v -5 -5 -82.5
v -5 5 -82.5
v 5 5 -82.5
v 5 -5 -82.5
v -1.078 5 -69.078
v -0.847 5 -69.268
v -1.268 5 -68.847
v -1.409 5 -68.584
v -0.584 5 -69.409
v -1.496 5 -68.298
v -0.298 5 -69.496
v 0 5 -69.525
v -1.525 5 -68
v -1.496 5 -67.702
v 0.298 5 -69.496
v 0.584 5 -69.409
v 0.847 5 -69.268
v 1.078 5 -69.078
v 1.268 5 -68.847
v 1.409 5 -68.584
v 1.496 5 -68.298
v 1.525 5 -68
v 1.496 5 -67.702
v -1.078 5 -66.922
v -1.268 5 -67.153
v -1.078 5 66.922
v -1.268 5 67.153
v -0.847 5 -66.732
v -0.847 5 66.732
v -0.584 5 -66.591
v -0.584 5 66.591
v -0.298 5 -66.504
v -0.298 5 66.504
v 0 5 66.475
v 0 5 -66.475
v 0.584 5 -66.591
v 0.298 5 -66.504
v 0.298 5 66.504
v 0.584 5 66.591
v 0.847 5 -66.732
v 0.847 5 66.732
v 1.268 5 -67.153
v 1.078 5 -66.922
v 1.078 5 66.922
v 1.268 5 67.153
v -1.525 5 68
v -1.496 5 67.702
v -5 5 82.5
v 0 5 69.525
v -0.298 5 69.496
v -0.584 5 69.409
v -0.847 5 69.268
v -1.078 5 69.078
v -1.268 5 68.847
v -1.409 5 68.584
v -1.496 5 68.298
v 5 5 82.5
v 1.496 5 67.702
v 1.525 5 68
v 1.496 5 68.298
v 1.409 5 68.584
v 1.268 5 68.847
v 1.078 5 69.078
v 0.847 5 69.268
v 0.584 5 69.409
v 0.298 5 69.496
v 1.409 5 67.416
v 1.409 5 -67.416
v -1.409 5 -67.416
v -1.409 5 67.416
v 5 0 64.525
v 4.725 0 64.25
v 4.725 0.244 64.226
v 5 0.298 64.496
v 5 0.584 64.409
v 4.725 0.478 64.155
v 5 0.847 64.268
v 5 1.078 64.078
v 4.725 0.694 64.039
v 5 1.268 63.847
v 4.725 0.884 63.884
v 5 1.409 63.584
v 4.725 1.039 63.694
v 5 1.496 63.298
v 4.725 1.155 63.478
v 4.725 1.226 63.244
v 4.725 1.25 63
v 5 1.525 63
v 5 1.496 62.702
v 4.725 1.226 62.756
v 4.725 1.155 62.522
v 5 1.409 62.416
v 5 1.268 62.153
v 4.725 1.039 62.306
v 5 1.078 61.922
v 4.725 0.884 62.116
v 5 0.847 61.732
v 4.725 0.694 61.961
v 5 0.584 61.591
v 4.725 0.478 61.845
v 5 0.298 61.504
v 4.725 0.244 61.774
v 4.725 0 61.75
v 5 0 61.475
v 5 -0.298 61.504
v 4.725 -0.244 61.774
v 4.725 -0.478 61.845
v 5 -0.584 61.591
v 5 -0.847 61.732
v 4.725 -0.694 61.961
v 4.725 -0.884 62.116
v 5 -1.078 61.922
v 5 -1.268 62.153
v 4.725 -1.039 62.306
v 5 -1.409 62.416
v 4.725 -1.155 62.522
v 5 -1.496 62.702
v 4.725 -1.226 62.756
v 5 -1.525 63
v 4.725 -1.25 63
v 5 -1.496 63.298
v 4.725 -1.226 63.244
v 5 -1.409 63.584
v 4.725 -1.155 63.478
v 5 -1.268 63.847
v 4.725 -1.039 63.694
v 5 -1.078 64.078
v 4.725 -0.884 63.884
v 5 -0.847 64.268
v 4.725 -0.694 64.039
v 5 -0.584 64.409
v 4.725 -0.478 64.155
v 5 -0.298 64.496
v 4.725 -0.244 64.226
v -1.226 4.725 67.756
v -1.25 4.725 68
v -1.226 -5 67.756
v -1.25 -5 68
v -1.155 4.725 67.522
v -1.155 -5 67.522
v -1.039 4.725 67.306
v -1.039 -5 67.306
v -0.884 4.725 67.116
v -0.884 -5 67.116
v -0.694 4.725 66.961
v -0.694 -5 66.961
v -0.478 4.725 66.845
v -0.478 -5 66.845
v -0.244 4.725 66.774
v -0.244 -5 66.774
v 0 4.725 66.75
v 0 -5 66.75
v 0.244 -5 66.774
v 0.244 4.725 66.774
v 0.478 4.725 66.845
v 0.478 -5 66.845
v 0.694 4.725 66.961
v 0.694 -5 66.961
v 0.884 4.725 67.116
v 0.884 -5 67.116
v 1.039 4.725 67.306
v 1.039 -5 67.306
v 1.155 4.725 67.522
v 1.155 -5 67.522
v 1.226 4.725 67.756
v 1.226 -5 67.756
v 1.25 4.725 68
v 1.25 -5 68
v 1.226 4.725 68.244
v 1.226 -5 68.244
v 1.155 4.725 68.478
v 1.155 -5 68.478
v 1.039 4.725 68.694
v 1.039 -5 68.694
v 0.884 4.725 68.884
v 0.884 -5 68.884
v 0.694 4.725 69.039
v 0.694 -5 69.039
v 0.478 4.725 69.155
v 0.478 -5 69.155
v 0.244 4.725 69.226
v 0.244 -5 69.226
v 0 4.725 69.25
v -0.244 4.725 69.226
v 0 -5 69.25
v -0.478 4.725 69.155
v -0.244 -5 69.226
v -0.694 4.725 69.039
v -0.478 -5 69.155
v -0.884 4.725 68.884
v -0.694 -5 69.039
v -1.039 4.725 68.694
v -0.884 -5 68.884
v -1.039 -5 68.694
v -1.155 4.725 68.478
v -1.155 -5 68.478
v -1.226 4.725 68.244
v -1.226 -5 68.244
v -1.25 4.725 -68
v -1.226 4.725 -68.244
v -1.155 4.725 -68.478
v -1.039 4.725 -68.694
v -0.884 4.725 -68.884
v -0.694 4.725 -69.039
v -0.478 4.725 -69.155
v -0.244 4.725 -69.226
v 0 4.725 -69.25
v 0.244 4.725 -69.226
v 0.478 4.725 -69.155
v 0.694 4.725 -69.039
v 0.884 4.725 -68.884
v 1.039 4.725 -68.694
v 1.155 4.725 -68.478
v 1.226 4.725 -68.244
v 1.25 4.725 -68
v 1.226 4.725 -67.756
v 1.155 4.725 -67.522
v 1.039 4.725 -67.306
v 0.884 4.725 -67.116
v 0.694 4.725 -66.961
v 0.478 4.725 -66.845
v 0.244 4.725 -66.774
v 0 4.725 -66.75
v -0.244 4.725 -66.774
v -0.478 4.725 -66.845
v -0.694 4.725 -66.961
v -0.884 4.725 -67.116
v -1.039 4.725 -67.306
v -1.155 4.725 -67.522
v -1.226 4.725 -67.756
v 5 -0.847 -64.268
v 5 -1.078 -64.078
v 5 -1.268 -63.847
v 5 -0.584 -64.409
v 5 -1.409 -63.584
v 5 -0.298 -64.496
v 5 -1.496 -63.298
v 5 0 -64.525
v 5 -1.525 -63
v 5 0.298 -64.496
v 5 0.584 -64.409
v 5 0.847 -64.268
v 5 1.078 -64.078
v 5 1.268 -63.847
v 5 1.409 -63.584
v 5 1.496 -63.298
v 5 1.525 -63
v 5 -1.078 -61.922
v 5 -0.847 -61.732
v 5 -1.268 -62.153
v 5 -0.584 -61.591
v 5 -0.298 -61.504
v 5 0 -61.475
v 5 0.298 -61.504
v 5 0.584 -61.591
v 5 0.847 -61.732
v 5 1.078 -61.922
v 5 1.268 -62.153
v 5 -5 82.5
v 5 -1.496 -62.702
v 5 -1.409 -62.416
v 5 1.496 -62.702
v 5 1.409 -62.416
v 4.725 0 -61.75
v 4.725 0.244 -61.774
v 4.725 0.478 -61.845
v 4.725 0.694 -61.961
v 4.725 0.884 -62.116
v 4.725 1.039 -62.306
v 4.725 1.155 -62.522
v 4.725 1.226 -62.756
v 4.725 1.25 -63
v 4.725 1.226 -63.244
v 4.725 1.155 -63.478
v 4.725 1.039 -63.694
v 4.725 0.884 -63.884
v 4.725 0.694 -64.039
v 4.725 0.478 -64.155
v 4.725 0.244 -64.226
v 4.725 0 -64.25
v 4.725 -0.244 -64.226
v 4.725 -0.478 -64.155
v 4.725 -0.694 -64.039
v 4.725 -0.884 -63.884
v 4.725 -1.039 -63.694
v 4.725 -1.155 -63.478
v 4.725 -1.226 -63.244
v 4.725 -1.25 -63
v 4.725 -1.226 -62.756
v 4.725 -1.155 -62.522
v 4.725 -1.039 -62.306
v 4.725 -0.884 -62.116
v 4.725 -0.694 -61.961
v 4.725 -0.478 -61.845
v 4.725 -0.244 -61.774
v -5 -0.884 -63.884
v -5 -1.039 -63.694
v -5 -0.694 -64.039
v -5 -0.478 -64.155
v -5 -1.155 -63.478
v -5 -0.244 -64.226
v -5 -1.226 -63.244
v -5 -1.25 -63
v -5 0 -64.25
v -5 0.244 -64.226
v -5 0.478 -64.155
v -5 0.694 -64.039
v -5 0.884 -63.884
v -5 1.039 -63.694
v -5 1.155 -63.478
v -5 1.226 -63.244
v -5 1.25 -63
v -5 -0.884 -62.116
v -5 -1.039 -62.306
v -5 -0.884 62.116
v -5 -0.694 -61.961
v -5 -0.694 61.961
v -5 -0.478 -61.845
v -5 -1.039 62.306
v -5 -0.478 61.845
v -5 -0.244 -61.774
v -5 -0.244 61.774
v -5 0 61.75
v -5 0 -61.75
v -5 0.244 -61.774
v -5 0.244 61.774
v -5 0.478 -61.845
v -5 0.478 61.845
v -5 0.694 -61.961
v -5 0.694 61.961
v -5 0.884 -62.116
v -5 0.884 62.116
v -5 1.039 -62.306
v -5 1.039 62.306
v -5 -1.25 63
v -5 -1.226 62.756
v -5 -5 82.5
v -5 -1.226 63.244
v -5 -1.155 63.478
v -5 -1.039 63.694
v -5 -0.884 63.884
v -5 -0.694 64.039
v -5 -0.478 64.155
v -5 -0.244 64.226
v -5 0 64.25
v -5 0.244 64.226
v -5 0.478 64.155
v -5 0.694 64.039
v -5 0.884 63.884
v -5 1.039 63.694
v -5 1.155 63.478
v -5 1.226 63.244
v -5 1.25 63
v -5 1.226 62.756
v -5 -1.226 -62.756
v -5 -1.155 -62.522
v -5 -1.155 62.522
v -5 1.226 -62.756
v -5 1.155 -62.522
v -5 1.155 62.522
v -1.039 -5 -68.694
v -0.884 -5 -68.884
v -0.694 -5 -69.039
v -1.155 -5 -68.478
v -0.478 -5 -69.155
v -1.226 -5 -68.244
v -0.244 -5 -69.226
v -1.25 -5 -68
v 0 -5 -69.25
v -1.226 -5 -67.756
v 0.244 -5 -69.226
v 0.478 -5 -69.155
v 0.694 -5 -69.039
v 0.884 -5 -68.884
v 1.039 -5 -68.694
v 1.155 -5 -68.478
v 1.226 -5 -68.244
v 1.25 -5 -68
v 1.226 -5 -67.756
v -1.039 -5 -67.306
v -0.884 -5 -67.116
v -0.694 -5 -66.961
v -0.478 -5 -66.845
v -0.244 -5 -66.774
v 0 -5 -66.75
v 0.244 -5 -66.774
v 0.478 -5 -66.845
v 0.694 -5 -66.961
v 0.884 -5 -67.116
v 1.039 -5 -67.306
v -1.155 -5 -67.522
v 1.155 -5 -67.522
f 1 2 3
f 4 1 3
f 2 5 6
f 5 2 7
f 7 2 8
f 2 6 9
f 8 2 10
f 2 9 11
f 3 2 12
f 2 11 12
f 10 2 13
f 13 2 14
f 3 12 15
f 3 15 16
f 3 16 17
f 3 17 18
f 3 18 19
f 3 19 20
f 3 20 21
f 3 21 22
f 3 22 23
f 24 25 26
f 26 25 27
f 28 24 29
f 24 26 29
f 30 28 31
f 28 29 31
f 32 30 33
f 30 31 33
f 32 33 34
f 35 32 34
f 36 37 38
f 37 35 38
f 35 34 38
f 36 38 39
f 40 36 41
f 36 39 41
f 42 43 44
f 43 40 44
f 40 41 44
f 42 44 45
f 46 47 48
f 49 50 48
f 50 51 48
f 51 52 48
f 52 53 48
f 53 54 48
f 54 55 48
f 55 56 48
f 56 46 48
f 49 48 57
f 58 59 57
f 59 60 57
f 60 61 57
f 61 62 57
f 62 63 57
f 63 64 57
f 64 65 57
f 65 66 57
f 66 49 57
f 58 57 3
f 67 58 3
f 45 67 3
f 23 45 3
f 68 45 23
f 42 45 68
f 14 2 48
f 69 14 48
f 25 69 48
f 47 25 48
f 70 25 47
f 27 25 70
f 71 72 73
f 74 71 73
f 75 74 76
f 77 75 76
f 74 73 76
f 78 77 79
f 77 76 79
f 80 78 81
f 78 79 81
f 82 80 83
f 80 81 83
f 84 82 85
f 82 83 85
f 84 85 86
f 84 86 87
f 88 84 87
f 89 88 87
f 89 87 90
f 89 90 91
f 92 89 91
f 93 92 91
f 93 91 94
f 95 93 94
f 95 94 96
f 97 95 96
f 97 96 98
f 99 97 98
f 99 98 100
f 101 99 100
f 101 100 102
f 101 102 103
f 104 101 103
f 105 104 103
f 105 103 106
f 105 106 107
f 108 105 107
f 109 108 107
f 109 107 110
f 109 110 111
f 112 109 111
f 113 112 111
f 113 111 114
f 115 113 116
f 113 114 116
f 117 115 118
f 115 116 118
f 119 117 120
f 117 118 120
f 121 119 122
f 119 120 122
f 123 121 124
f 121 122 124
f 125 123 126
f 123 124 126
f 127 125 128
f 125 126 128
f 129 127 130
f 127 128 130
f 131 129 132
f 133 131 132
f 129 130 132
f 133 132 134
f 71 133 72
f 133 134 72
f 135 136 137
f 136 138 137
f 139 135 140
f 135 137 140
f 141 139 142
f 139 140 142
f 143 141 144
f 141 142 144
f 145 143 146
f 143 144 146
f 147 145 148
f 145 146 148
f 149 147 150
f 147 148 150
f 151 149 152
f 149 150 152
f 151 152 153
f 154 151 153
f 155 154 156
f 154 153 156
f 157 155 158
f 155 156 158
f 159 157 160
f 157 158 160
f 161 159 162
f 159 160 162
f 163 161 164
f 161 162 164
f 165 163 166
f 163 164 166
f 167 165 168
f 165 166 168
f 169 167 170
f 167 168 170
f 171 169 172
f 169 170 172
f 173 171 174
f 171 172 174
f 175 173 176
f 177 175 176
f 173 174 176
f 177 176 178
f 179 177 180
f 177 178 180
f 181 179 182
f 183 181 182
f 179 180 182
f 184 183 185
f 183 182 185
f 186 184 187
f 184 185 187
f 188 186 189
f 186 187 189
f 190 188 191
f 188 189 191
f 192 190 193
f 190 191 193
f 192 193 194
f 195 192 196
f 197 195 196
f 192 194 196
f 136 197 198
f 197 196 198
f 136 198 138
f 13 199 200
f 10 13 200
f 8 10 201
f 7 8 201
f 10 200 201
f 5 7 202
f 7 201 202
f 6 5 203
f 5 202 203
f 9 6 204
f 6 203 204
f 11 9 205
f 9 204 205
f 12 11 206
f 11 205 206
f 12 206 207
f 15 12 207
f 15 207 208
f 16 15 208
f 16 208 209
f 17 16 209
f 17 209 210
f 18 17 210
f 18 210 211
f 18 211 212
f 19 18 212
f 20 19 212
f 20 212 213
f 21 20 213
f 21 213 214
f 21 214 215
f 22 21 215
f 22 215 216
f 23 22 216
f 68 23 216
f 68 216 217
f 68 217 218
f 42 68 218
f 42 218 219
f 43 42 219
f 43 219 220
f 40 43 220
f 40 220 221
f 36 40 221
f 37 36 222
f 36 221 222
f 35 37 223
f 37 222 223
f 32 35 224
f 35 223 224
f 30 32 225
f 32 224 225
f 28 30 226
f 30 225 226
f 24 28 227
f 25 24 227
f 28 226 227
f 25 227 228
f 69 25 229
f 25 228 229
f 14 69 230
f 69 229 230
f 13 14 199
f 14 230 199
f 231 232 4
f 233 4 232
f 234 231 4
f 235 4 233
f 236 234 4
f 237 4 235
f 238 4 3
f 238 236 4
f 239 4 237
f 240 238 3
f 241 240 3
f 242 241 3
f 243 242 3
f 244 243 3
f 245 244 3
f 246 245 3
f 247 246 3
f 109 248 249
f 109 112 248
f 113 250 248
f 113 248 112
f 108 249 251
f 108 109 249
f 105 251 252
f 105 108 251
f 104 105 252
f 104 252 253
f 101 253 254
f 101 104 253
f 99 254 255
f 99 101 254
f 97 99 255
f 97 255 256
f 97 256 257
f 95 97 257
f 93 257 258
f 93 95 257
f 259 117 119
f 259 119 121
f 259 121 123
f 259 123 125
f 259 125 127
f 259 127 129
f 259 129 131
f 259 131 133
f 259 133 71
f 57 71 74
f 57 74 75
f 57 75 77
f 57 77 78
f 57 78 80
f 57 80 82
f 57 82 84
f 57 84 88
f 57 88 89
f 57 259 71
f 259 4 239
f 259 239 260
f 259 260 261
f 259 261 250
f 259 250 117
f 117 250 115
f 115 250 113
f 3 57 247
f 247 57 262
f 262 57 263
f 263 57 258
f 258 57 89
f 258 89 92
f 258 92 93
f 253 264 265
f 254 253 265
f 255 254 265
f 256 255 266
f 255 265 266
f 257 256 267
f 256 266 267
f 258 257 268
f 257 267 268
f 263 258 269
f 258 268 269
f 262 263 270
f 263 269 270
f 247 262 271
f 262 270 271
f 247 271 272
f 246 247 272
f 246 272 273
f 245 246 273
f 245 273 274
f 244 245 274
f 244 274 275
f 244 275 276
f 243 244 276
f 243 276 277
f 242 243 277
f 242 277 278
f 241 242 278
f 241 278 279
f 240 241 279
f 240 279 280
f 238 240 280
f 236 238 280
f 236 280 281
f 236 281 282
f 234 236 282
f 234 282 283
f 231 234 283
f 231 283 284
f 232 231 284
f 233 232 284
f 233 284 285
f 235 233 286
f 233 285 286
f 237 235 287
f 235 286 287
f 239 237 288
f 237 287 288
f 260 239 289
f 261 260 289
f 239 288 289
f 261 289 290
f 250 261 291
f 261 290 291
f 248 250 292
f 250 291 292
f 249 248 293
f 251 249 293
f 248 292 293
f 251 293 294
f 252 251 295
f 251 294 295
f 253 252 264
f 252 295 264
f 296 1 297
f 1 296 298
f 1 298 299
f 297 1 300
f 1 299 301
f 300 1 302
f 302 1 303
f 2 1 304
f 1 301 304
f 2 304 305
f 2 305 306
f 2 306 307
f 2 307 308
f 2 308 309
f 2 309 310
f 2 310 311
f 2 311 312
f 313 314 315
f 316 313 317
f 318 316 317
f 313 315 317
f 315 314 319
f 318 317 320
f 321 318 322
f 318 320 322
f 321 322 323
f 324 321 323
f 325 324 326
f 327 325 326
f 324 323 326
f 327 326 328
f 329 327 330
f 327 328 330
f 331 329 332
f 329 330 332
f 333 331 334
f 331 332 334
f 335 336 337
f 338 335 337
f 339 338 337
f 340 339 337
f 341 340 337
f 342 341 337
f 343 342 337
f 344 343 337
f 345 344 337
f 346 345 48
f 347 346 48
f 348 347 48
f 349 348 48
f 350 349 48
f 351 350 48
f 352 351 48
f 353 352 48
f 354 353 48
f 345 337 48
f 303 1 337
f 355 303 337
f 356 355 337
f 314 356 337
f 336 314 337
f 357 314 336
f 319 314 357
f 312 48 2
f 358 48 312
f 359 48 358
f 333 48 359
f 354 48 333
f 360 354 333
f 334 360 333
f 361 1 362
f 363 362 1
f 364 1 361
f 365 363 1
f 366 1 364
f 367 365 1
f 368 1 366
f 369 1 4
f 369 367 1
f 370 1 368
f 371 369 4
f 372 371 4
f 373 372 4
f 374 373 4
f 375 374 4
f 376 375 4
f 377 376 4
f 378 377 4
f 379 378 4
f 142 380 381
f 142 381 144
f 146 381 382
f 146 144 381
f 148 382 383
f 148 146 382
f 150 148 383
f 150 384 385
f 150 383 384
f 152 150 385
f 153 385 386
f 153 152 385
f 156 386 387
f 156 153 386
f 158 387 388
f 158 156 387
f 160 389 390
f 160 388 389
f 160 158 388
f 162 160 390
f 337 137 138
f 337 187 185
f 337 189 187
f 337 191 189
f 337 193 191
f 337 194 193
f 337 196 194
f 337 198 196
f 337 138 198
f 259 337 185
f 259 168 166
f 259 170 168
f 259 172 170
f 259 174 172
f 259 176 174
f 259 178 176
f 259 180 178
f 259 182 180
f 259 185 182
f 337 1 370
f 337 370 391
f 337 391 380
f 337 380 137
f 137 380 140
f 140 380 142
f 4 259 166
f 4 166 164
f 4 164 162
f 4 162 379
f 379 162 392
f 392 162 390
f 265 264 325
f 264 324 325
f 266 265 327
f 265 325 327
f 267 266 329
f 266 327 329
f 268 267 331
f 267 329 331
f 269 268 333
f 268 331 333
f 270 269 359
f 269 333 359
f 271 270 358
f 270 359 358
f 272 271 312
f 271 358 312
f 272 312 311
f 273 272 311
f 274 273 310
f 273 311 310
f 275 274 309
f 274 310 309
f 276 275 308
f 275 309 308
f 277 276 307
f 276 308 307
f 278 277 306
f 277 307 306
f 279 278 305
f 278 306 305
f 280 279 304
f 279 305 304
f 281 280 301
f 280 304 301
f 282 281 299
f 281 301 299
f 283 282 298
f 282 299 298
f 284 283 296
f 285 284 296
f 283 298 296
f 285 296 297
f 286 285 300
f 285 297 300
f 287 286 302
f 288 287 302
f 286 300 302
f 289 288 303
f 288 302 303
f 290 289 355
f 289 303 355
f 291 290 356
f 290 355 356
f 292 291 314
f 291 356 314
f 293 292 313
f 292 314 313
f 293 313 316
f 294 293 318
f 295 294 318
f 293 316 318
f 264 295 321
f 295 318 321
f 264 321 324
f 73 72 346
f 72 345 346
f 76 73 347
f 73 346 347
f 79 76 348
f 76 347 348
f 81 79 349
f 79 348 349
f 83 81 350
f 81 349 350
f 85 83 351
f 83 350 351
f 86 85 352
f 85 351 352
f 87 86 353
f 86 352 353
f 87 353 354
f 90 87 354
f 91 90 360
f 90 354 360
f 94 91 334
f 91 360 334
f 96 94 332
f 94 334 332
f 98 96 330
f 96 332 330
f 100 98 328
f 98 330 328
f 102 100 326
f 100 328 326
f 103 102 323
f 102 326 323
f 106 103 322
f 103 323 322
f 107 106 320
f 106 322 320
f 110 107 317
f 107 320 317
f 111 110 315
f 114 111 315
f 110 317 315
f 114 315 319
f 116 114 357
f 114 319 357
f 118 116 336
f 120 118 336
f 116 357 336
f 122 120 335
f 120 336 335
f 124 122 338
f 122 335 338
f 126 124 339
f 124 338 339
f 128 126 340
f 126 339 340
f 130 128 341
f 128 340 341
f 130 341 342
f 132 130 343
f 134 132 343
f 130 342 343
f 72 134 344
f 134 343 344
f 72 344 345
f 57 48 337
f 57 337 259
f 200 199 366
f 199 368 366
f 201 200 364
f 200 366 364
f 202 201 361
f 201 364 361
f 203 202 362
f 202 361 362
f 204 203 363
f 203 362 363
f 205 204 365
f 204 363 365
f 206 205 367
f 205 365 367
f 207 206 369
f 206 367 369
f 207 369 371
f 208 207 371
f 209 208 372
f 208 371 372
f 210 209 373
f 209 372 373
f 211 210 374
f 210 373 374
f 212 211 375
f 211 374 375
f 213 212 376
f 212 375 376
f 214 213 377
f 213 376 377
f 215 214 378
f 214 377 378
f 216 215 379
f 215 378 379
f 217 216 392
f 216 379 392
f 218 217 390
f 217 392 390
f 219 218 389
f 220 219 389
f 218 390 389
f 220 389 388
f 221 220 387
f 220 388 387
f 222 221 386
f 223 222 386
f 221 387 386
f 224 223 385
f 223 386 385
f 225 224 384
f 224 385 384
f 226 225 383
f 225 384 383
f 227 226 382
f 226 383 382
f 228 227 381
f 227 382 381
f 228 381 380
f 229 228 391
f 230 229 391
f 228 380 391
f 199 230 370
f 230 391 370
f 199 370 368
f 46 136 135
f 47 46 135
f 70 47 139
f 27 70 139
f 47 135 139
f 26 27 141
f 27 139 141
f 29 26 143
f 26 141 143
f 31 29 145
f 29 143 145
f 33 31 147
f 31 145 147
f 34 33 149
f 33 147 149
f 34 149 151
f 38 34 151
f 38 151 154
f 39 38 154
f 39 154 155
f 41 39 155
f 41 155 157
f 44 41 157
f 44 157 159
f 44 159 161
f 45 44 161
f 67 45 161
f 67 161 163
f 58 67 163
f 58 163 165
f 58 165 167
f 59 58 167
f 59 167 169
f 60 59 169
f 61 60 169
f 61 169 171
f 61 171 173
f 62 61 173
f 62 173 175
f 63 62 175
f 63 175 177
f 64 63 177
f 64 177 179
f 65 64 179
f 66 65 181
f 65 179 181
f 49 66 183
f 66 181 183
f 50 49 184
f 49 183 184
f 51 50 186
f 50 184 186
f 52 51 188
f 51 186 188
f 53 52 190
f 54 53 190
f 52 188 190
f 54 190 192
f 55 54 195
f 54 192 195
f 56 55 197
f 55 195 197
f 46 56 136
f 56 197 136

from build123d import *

# Parameters (mm, degrees)
ESQUISSE1_W                     = 10
ESQUISSE1_H                     = 10
BOSS_EXTRU_1_DEPTH              = 82.5
TROU_TARAUD_M3X0_51_D           = 2.5
TROU_TARAUD_M3X0_51_CSINK_D     = 3.05
TROU_TARAUD_M3X0_51_CSINK_ANGLE = 90
TROU_TARAUD_M3X0_52_D           = 2.5
TROU_TARAUD_M3X0_52_CSINK_D     = 3.05
TROU_TARAUD_M3X0_52_CSINK_ANGLE = 90


with BuildPart() as part:
    # Esquisse1 → Boss.-Extru.1 (new body, symmetric)
    with BuildSketch(Plane.XY):
        Rectangle(ESQUISSE1_W, ESQUISSE1_H)
    extrude(amount=BOSS_EXTRU_1_DEPTH, both=True)

    # Trou taraudé M3x0.51 (through all)
    with Locations(Plane(origin=(5, 0, 0), x_dir=(0, 0, -1), z_dir=(1, 0, 0))):
        with Locations((63, 0), (-63, 0)):
            CounterSinkHole(TROU_TARAUD_M3X0_51_D / 2, TROU_TARAUD_M3X0_51_CSINK_D / 2, counter_sink_angle=TROU_TARAUD_M3X0_51_CSINK_ANGLE)

    # Trou taraudé M3x0.52 (through all)
    with Locations(Plane(origin=(0, 5, 0), x_dir=(1, 0, 0), z_dir=(0, 1, 0))):
        with Locations((0, 68), (0, -68)):
            CounterSinkHole(TROU_TARAUD_M3X0_52_D / 2, TROU_TARAUD_M3X0_52_CSINK_D / 2, counter_sink_angle=TROU_TARAUD_M3X0_52_CSINK_ANGLE)


solid = part.part
